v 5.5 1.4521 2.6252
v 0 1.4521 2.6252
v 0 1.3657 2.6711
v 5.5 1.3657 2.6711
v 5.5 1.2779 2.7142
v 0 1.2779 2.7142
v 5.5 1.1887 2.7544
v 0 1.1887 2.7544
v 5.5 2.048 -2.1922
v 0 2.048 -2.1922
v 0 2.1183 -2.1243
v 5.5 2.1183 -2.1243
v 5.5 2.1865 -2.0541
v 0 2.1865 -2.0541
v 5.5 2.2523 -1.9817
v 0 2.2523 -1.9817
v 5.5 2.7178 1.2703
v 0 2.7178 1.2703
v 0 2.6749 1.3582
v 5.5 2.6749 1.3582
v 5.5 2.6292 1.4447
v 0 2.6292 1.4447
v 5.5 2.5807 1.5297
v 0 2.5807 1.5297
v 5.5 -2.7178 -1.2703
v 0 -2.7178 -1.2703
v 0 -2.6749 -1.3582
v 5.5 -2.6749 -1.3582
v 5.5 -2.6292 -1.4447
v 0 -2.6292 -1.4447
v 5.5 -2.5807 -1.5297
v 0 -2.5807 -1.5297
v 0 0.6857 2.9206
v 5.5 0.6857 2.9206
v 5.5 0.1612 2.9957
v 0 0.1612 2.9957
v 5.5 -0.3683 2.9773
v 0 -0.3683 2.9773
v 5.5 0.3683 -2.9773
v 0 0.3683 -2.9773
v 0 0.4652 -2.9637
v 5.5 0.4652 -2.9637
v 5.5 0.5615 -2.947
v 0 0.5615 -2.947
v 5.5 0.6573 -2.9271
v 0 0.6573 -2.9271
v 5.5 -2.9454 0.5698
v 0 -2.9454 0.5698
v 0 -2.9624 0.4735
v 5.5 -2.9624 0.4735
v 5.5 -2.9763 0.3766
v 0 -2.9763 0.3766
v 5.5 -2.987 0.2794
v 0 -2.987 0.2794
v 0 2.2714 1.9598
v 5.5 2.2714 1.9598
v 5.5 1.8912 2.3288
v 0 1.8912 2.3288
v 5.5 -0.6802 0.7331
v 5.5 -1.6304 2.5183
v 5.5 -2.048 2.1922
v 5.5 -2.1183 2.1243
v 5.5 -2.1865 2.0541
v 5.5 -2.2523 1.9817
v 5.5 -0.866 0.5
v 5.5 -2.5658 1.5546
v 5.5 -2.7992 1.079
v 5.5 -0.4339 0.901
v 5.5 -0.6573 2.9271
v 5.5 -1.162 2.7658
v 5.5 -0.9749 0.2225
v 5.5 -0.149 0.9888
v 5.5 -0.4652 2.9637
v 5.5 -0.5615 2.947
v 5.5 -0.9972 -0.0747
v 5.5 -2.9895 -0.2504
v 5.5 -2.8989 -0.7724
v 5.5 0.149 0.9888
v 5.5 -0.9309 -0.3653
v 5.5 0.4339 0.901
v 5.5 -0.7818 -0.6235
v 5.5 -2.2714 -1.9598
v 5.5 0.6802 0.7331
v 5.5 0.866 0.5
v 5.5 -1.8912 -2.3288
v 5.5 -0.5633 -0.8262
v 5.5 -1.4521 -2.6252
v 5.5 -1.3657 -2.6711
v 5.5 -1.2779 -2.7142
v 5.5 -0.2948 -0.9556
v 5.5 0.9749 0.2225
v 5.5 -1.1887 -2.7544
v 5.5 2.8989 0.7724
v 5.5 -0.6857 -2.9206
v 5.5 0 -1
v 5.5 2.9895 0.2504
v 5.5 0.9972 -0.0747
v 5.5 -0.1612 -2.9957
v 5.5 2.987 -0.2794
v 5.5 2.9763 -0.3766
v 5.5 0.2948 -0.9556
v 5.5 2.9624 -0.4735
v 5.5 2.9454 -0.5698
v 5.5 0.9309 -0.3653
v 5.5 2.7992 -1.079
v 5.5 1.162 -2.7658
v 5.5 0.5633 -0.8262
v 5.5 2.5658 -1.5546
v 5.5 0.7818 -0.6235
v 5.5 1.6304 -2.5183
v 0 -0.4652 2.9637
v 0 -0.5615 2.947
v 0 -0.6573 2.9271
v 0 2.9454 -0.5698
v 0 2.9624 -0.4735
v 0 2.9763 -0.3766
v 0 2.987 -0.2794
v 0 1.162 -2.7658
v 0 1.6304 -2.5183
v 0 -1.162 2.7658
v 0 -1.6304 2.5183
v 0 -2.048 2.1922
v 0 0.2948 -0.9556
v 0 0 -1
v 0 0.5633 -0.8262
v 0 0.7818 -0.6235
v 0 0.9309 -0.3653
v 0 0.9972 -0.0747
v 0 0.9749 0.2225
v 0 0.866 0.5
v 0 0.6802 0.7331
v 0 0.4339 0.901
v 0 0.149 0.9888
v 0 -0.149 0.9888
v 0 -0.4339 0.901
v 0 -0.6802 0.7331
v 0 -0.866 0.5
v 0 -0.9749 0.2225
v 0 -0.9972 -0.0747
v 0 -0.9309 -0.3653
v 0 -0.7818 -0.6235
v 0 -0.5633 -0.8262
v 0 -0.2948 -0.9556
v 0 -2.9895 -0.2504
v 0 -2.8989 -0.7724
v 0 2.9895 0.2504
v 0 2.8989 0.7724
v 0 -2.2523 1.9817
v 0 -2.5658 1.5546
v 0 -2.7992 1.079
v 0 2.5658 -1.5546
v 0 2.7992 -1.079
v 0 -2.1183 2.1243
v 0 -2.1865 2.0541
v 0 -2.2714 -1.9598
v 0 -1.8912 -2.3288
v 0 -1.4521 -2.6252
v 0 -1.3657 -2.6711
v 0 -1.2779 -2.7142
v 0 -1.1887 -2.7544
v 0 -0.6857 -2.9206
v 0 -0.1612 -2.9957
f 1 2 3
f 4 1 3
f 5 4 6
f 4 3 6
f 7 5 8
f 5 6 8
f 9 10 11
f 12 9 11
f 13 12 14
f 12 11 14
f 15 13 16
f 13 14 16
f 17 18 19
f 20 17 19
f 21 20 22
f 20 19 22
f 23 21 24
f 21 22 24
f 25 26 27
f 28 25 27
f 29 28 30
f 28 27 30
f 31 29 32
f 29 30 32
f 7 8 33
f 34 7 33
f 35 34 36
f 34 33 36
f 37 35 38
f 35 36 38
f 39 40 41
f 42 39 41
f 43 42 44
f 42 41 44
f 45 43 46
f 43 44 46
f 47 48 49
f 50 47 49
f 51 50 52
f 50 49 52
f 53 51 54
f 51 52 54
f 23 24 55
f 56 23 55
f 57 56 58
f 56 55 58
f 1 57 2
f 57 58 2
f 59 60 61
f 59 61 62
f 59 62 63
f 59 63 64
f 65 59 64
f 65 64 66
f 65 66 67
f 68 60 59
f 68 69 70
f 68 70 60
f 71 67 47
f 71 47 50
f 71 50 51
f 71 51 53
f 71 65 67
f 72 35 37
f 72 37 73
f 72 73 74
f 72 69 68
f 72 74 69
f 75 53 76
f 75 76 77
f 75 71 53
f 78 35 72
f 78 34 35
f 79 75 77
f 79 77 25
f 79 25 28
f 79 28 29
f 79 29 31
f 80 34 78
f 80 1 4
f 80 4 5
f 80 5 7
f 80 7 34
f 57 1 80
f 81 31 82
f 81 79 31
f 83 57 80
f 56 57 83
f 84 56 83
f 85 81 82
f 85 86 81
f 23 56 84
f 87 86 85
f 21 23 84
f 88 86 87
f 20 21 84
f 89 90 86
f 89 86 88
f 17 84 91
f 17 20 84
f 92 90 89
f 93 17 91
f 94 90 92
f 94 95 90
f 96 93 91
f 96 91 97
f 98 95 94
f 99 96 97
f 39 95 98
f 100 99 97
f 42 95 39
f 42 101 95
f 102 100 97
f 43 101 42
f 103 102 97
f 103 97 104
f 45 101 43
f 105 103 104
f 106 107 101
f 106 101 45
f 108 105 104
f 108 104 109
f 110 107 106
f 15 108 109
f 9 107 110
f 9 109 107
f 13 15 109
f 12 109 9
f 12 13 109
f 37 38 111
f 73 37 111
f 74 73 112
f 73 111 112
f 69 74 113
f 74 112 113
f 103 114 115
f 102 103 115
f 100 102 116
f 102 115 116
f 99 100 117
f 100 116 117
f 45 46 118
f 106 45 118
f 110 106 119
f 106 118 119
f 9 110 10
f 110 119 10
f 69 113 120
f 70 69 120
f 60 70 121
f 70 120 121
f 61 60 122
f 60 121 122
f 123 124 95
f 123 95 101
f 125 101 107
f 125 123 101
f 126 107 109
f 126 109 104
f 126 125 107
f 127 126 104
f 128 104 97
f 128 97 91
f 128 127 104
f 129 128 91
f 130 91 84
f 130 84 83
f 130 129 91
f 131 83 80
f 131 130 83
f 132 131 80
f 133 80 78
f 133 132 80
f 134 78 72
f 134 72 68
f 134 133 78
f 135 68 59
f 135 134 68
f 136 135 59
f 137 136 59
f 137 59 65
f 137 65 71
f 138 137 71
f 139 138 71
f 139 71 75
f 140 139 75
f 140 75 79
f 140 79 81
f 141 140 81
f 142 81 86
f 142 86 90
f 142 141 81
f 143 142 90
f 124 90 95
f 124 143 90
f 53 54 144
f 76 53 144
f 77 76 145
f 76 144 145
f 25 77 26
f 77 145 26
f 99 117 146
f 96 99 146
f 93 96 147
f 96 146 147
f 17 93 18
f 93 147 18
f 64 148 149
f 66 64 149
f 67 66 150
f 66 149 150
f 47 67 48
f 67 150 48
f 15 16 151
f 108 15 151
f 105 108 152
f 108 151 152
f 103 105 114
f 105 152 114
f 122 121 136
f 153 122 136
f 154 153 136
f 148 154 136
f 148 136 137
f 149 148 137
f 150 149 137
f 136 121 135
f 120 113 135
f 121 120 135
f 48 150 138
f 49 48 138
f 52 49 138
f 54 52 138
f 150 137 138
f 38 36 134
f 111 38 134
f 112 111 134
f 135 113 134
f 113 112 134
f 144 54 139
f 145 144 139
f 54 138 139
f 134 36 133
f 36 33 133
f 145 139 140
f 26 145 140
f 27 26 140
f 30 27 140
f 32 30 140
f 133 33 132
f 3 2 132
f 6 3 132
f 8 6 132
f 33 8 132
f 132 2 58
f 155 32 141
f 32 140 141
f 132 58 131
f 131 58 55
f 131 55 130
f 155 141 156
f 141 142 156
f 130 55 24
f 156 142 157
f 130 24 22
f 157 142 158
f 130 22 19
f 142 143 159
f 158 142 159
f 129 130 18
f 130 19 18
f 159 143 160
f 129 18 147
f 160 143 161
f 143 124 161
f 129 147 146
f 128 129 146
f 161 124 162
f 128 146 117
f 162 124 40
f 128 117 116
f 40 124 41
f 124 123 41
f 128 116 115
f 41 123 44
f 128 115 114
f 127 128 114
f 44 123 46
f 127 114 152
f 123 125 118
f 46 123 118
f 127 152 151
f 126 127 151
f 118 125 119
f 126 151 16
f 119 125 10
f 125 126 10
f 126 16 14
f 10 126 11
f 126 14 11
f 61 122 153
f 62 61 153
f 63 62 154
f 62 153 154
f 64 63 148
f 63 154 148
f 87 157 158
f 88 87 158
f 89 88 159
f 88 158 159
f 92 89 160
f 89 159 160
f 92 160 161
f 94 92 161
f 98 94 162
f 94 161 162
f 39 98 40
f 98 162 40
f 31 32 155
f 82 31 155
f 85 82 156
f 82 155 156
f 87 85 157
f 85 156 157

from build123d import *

# Parameters (mm, degrees)
ESQUISSE1_R        = 1
BOSS_EXTRU_1_DEPTH = 5.5
BOSS_EXTRU_2_START = -5.5
ESQUISSE2_R        = 3
ESQUISSE2_R_2      = 1
BOSS_EXTRU_2_DEPTH = 5.5


with BuildPart() as part:
    # Esquisse1 → Boss.-Extru.1 (new body)
    with BuildSketch(Plane(origin=(0, 0, 0), x_dir=(0, 0, -1), z_dir=(1, 0, 0))):
        with BuildLine():
            ThreePointArc((2.977310095, 0.368272455), (2.955741127, 0.513414445), (2.927100903, 0.657328154))
            add(Edge.make_bspline(
                [(2.211403727, 0.79214554), (2.222779445, 0.796220429), (2.274133198, 0.805614359), (2.359373738, 0.810478726), (2.538607422, 0.796225963), (2.732062921, 0.744216047), (2.878239296, 0.681280138), (2.927100903, 0.657328154)],
                knots=[0, 0, 0, 0, 0.036250587, 0.155621312, 0.255291203, 0.575254513, 0.744084786, 0.744084786, 0.744084786, 0.744084786], degree=3))
            add(Edge.make_bspline(
                [(2.211403727, 0.79214554), (2.132130324, 0.763749064), (1.99001212, 0.681956821), (1.750090704, 0.694113528), (1.707279056, 0.775127876)],
                knots=[0, 0, 0, 0, 0.252617676, 0.527509393, 0.527509393, 0.527509393, 0.527509393], degree=3))
            ThreePointArc((1.707279056, 0.775127876), (1.657764419, 0.876037746), (1.602292085, 0.973799299))
            add(Edge.make_bspline(
                [(1.90038092, 1.380707558), (1.832256922, 1.331212576), (1.684611138, 1.259880414), (1.559480437, 1.054813647), (1.602292085, 0.973799299)],
                knots=[0, 0, 0, 0, 0.252617676, 0.527509393, 0.527509393, 0.527509393, 0.527509393], degree=3))
            add(Edge.make_bspline(
                [(1.90038092, 1.380707558), (1.9101567, 1.387810078), (1.946851003, 1.424944725), (1.998895263, 1.49262786), (2.088102134, 1.648736761), (2.154127637, 1.837868182), (2.184488772, 1.994094501), (2.192229346, 2.04795764)],
                knots=[0, 0, 0, 0, 0.036250587, 0.155621312, 0.255291203, 0.575254513, 0.744084786, 0.744084786, 0.744084786, 0.744084786], degree=3))
            ThreePointArc((2.192229346, 2.04795764), (2.089467363, 2.152702055), (1.98170658, 2.25229639))
            add(Edge.make_bspline(
                [(1.32345173, 1.940689701), (1.33025972, 1.950672835), (1.366284165, 1.988457663), (1.432386008, 2.04249615), (1.585766668, 2.136316339), (1.772846116, 2.207949723), (1.928098087, 2.242953821), (1.98170658, 2.25229639)],
                knots=[0, 0, 0, 0, 0.036250587, 0.155621312, 0.255291203, 0.575254513, 0.744084786, 0.744084786, 0.744084786, 0.744084786], degree=3))
            add(Edge.make_bspline(
                [(1.32345173, 1.940689701), (1.27600923, 1.871120733), (1.209109462, 1.721414433), (1.007863426, 1.590227146), (0.925609036, 1.630605075)],
                knots=[0, 0, 0, 0, 0.252617676, 0.527509393, 0.527509393, 0.527509393, 0.527509393], degree=3))
            ThreePointArc((0.925609036, 1.630605075), (0.82623752, 1.683138901), (0.72389666, 1.729623839))
            add(Edge.make_bspline(
                [(0.72588092, 2.234031757), (0.699859868, 2.153947194), (0.622339913, 2.009454248), (0.641642271, 1.770001768), (0.72389666, 1.729623839)],
                knots=[0, 0, 0, 0, 0.252617676, 0.527509393, 0.527509393, 0.527509393, 0.527509393], degree=3))
            add(Edge.make_bspline(
                [(0.72588092, 2.234031757), (0.729614936, 2.245523876), (0.737474053, 2.297134806), (0.739795594, 2.382482461), (0.720206959, 2.561211698), (0.662454053, 2.753031049), (0.595189201, 2.897266624), (0.569791499, 2.945392614)],
                knots=[0, 0, 0, 0, 0.036250587, 0.155621312, 0.255291203, 0.575254513, 0.744084786, 0.744084786, 0.744084786, 0.744084786], degree=3))
            ThreePointArc((0.569791499, 2.945392614), (0.425088085, 2.969730648), (0.279367699, 2.986963958))
            add(Edge.make_bspline(
                [(-0.070013845, 2.347956359), (-0.070374004, 2.360034519), (-0.063438981, 2.411777724), (-0.041724492, 2.494349468), (0.027216945, 2.660406485), (0.136462351, 2.82832165), (0.241488941, 2.947895379), (0.279367699, 2.986963958)],
                knots=[0, 0, 0, 0, 0.036250587, 0.155621312, 0.255291203, 0.575254513, 0.744084786, 0.744084786, 0.744084786, 0.744084786], degree=3))
            add(Edge.make_bspline(
                [(-0.070013845, 2.347956359), (-0.06750402, 2.263787878), (-0.033631914, 2.103350241), (-0.119333425, 1.878928045), (-0.209612175, 1.863246558)],
                knots=[0, 0, 0, 0, 0.252617676, 0.527509393, 0.527509393, 0.527509393, 0.527509393], degree=3))
            ThreePointArc((-0.209612175, 1.863246558), (-0.320884028, 1.847338204), (-0.431002684, 1.824790861))
            add(Edge.make_bspline(
                [(-0.72588092, 2.234031757), (-0.699859868, 2.153947194), (-0.677644007, 1.991484859), (-0.521281435, 1.809109374), (-0.431002684, 1.824790861)],
                knots=[0, 0, 0, 0, 0.252617676, 0.527509393, 0.527509393, 0.527509393, 0.527509393], degree=3))
            add(Edge.make_bspline(
                [(-0.72588092, 2.234031757), (-0.729614936, 2.245523876), (-0.75359292, 2.291897469), (-0.801880846, 2.36230974), (-0.922782795, 2.495390819), (-1.082254463, 2.616629628), (-1.221452415, 2.693781371), (-1.270287335, 2.717787719)],
                knots=[0, 0, 0, 0, 0.036250587, 0.155621312, 0.255291203, 0.575254513, 0.744084786, 0.744084786, 0.744084786, 0.744084786], degree=3))
            ThreePointArc((-1.270287335, 2.717787719), (-1.401660393, 2.65242307), (-1.529680147, 2.580712818))
            add(Edge.make_bspline(
                [(-1.436736511, 1.858383491), (-1.44412725, 1.867943232), (-1.468930592, 1.913880668), (-1.499897654, 1.993446068), (-1.541728726, 2.168311777), (-1.552045394, 2.368370838), (-1.537360771, 2.526841097), (-1.529680147, 2.580712818)],
                knots=[0, 0, 0, 0, 0.036250587, 0.155621312, 0.255291203, 0.575254513, 0.744084786, 0.744084786, 0.744084786, 0.744084786], degree=3))
            add(Edge.make_bspline(
                [(-1.436736511, 1.858383491), (-1.385233029, 1.791764998), (-1.263527042, 1.681877747), (-1.200948963, 1.449942292), (-1.26476866, 1.384191185)],
                knots=[0, 0, 0, 0, 0.252617676, 0.527509393, 0.527509393, 0.527509393, 0.527509393], degree=3))
            ThreePointArc((-1.26476866, 1.384191185), (-1.345438785, 1.305917102), (-1.421273653, 1.222949796))
            add(Edge.make_bspline(
                [(-1.90038092, 1.380707558), (-1.832256922, 1.331212576), (-1.718790948, 1.212835941), (-1.48509335, 1.157198689), (-1.421273653, 1.222949796)],
                knots=[0, 0, 0, 0, 0.252617676, 0.527509393, 0.527509393, 0.527509393, 0.527509393], degree=3))
            add(Edge.make_bspline(
                [(-1.90038092, 1.380707558), (-1.9101567, 1.387810078), (-1.956813011, 1.411233197), (-2.037266059, 1.43981499), (-2.213300886, 1.476415463), (-2.413578559, 1.480764624), (-2.571540724, 1.461363192), (-2.625159582, 1.45208029)],
                knots=[0, 0, 0, 0, 0.036250587, 0.155621312, 0.255291203, 0.575254513, 0.744084786, 0.744084786, 0.744084786, 0.744084786], degree=3))
            ThreePointArc((-2.625159582, 1.45208029), (-2.693022242, 1.321980032), (-2.75444217, 1.188717096))
            add(Edge.make_bspline(
                [(-2.254674663, 0.658971294), (-2.266272971, 0.662361119), (-2.313340644, 0.684946248), (-2.385160892, 0.731114025), (-2.521786425, 0.847995669), (-2.64772455, 1.003782864), (-2.728990923, 1.140619401), (-2.75444217, 1.188717096)],
                knots=[0, 0, 0, 0, 0.036250587, 0.155621312, 0.255291203, 0.575254513, 0.744084786, 0.744084786, 0.744084786, 0.744084786], degree=3))
            add(Edge.make_bspline(
                [(-2.254674663, 0.658971294), (-2.173850103, 0.635348788), (-2.010797786, 0.617985118), (-1.823842817, 0.467127866), (-1.836826505, 0.376421826)],
                knots=[0, 0, 0, 0, 0.252617676, 0.527509393, 0.527509393, 0.527509393, 0.527509393], degree=3))
            ThreePointArc((-1.836826505, 0.376421826), (-1.856081655, 0.265680053), (-1.868666393, 0.153983476))
            add(Edge.make_bspline(
                [(-2.349, 0), (-2.264794108, 0), (-2.103418166, -0.029075083), (-1.881650081, 0.063277436), (-1.868666393, 0.153983476)],
                knots=[0, 0, 0, 0, 0.252617676, 0.527509393, 0.527509393, 0.527509393, 0.527509393], degree=3))
            add(Edge.make_bspline(
                [(-2.349, 0), (-2.361083529, 0), (-2.412597041, -0.00847419), (-2.494484881, -0.032640149), (-2.658413265, -0.106500419), (-2.822997679, -0.220702136), (-2.93938788, -0.329246056), (-2.977310095, -0.368272455)],
                knots=[0, 0, 0, 0, 0.036250587, 0.155621312, 0.255291203, 0.575254513, 0.744084786, 0.744084786, 0.744084786, 0.744084786], degree=3))
            ThreePointArc((-2.977310095, -0.368272455), (-2.955741127, -0.513414445), (-2.927100903, -0.657328154))
            add(Edge.make_bspline(
                [(-2.211403727, -0.79214554), (-2.222779445, -0.796220429), (-2.274133198, -0.805614359), (-2.359373738, -0.810478726), (-2.538607422, -0.796225963), (-2.732062921, -0.744216047), (-2.878239296, -0.681280138), (-2.927100903, -0.657328154)],
                knots=[0, 0, 0, 0, 0.036250587, 0.155621312, 0.255291203, 0.575254513, 0.744084786, 0.744084786, 0.744084786, 0.744084786], degree=3))
            add(Edge.make_bspline(
                [(-2.211403727, -0.79214554), (-2.132130324, -0.763749064), (-1.99001212, -0.681956821), (-1.750090704, -0.694113528), (-1.707279056, -0.775127876)],
                knots=[0, 0, 0, 0, 0.252617676, 0.527509393, 0.527509393, 0.527509393, 0.527509393], degree=3))
            ThreePointArc((-1.707279056, -0.775127876), (-1.657764419, -0.876037746), (-1.602292085, -0.973799299))
            add(Edge.make_bspline(
                [(-1.90038092, -1.380707558), (-1.832256922, -1.331212576), (-1.684611138, -1.259880414), (-1.559480437, -1.054813647), (-1.602292085, -0.973799299)],
                knots=[0, 0, 0, 0, 0.252617676, 0.527509393, 0.527509393, 0.527509393, 0.527509393], degree=3))
            add(Edge.make_bspline(
                [(-1.90038092, -1.380707558), (-1.9101567, -1.387810078), (-1.946851003, -1.424944725), (-1.998895263, -1.49262786), (-2.088102134, -1.648736761), (-2.154127637, -1.837868182), (-2.184488772, -1.994094501), (-2.192229346, -2.04795764)],
                knots=[0, 0, 0, 0, 0.036250587, 0.155621312, 0.255291203, 0.575254513, 0.744084786, 0.744084786, 0.744084786, 0.744084786], degree=3))
            ThreePointArc((-2.192229346, -2.04795764), (-2.089467363, -2.152702055), (-1.98170658, -2.25229639))
            add(Edge.make_bspline(
                [(-1.32345173, -1.940689701), (-1.33025972, -1.950672835), (-1.366284165, -1.988457663), (-1.432386008, -2.04249615), (-1.585766668, -2.136316339), (-1.772846116, -2.207949723), (-1.928098087, -2.242953821), (-1.98170658, -2.25229639)],
                knots=[0, 0, 0, 0, 0.036250587, 0.155621312, 0.255291203, 0.575254513, 0.744084786, 0.744084786, 0.744084786, 0.744084786], degree=3))
            add(Edge.make_bspline(
                [(-1.32345173, -1.940689701), (-1.27600923, -1.871120733), (-1.209109462, -1.721414433), (-1.007863426, -1.590227146), (-0.925609036, -1.630605075)],
                knots=[0, 0, 0, 0, 0.252617676, 0.527509393, 0.527509393, 0.527509393, 0.527509393], degree=3))
            ThreePointArc((-0.925609036, -1.630605075), (-0.82623752, -1.683138901), (-0.72389666, -1.729623839))
            add(Edge.make_bspline(
                [(-0.72588092, -2.234031757), (-0.699859868, -2.153947194), (-0.622339913, -2.009454248), (-0.641642271, -1.770001768), (-0.72389666, -1.729623839)],
                knots=[0, 0, 0, 0, 0.252617676, 0.527509393, 0.527509393, 0.527509393, 0.527509393], degree=3))
            add(Edge.make_bspline(
                [(-0.72588092, -2.234031757), (-0.729614936, -2.245523876), (-0.737474053, -2.297134806), (-0.739795594, -2.382482461), (-0.720206959, -2.561211698), (-0.662454053, -2.753031049), (-0.595189201, -2.897266624), (-0.569791499, -2.945392614)],
                knots=[0, 0, 0, 0, 0.036250587, 0.155621312, 0.255291203, 0.575254513, 0.744084786, 0.744084786, 0.744084786, 0.744084786], degree=3))
            ThreePointArc((-0.569791499, -2.945392614), (-0.425088085, -2.969730648), (-0.279367699, -2.986963958))
            add(Edge.make_bspline(
                [(0.070013845, -2.347956359), (0.070374004, -2.360034519), (0.063438981, -2.411777724), (0.041724492, -2.494349468), (-0.027216945, -2.660406485), (-0.136462351, -2.82832165), (-0.241488941, -2.947895379), (-0.279367699, -2.986963958)],
                knots=[0, 0, 0, 0, 0.036250587, 0.155621312, 0.255291203, 0.575254513, 0.744084786, 0.744084786, 0.744084786, 0.744084786], degree=3))
            add(Edge.make_bspline(
                [(0.070013845, -2.347956359), (0.06750402, -2.263787879), (0.033631914, -2.103350241), (0.119333425, -1.878928045), (0.209612175, -1.863246558)],
                knots=[0, 0, 0, 0, 0.252617676, 0.527509393, 0.527509393, 0.527509393, 0.527509393], degree=3))
            ThreePointArc((0.209612175, -1.863246558), (0.320884028, -1.847338204), (0.431002684, -1.824790861))
            add(Edge.make_bspline(
                [(0.72588092, -2.234031757), (0.699859868, -2.153947194), (0.677644007, -1.991484859), (0.521281435, -1.809109374), (0.431002684, -1.824790861)],
                knots=[0, 0, 0, 0, 0.252617676, 0.527509393, 0.527509393, 0.527509393, 0.527509393], degree=3))
            add(Edge.make_bspline(
                [(0.72588092, -2.234031757), (0.729614936, -2.245523876), (0.75359292, -2.291897469), (0.801880846, -2.36230974), (0.922782795, -2.495390819), (1.082254463, -2.616629628), (1.221452415, -2.693781371), (1.270287335, -2.717787719)],
                knots=[0, 0, 0, 0, 0.036250587, 0.155621312, 0.255291203, 0.575254513, 0.744084786, 0.744084786, 0.744084786, 0.744084786], degree=3))
            ThreePointArc((1.270287335, -2.717787719), (1.401660393, -2.65242307), (1.529680147, -2.580712818))
            add(Edge.make_bspline(
                [(1.436736511, -1.858383491), (1.44412725, -1.867943232), (1.468930592, -1.913880668), (1.499897654, -1.993446068), (1.541728726, -2.168311777), (1.552045394, -2.368370838), (1.537360771, -2.526841097), (1.529680147, -2.580712818)],
                knots=[0, 0, 0, 0, 0.036250587, 0.155621312, 0.255291203, 0.575254513, 0.744084786, 0.744084786, 0.744084786, 0.744084786], degree=3))
            add(Edge.make_bspline(
                [(1.436736511, -1.858383491), (1.385233029, -1.791764998), (1.263527042, -1.681877747), (1.200948963, -1.449942292), (1.26476866, -1.384191185)],
                knots=[0, 0, 0, 0, 0.252617676, 0.527509393, 0.527509393, 0.527509393, 0.527509393], degree=3))
            ThreePointArc((1.26476866, -1.384191185), (1.345438785, -1.305917102), (1.421273653, -1.222949796))
            add(Edge.make_bspline(
                [(1.90038092, -1.380707558), (1.832256922, -1.331212576), (1.718790948, -1.212835941), (1.48509335, -1.157198689), (1.421273653, -1.222949796)],
                knots=[0, 0, 0, 0, 0.252617676, 0.527509393, 0.527509393, 0.527509393, 0.527509393], degree=3))
            add(Edge.make_bspline(
                [(1.90038092, -1.380707558), (1.9101567, -1.387810078), (1.956813011, -1.411233197), (2.037266059, -1.43981499), (2.213300886, -1.476415463), (2.413578559, -1.480764624), (2.571540724, -1.461363192), (2.625159582, -1.45208029)],
                knots=[0, 0, 0, 0, 0.036250587, 0.155621312, 0.255291203, 0.575254513, 0.744084786, 0.744084786, 0.744084786, 0.744084786], degree=3))
            ThreePointArc((2.625159582, -1.45208029), (2.693022242, -1.321980032), (2.75444217, -1.188717096))
            add(Edge.make_bspline(
                [(2.254674663, -0.658971294), (2.266272971, -0.662361119), (2.313340644, -0.684946248), (2.385160892, -0.731114025), (2.521786425, -0.847995669), (2.64772455, -1.003782864), (2.728990923, -1.140619401), (2.75444217, -1.188717096)],
                knots=[0, 0, 0, 0, 0.036250587, 0.155621312, 0.255291203, 0.575254513, 0.744084786, 0.744084786, 0.744084786, 0.744084786], degree=3))
            add(Edge.make_bspline(
                [(2.254674663, -0.658971294), (2.173850103, -0.635348788), (2.010797786, -0.617985118), (1.823842817, -0.467127866), (1.836826505, -0.376421826)],
                knots=[0, 0, 0, 0, 0.252617676, 0.527509393, 0.527509393, 0.527509393, 0.527509393], degree=3))
            ThreePointArc((1.836826505, -0.376421826), (1.856081655, -0.265680053), (1.868666393, -0.153983476))
            add(Edge.make_bspline(
                [(2.349, 0), (2.264794108, 0), (2.103418166, 0.029075083), (1.881650081, -0.063277436), (1.868666393, -0.153983476)],
                knots=[0, 0, 0, 0, 0.252617676, 0.527509393, 0.527509393, 0.527509393, 0.527509393], degree=3))
            add(Edge.make_bspline(
                [(2.349, 0), (2.361083529, 0), (2.412597041, 0.00847419), (2.494484881, 0.032640149), (2.658413265, 0.106500419), (2.822997679, 0.220702136), (2.93938788, 0.329246056), (2.977310095, 0.368272455)],
                knots=[0, 0, 0, 0, 0.036250587, 0.155621312, 0.255291203, 0.575254513, 0.744084786, 0.744084786, 0.744084786, 0.744084786], degree=3))
        make_face()
        Circle(ESQUISSE1_R, mode=Mode.SUBTRACT)
    extrude(amount=BOSS_EXTRU_1_DEPTH)

    # Esquisse2 → Boss.-Extru.2 (add)
    with BuildSketch(Plane(origin=(5.5, 0, 0), x_dir=(0, 0, -1), z_dir=(1, 0, 0)).offset(BOSS_EXTRU_2_START)):
        Circle(ESQUISSE2_R)
        Circle(ESQUISSE2_R_2, mode=Mode.SUBTRACT)
    extrude(amount=BOSS_EXTRU_2_DEPTH)


solid = part.part
